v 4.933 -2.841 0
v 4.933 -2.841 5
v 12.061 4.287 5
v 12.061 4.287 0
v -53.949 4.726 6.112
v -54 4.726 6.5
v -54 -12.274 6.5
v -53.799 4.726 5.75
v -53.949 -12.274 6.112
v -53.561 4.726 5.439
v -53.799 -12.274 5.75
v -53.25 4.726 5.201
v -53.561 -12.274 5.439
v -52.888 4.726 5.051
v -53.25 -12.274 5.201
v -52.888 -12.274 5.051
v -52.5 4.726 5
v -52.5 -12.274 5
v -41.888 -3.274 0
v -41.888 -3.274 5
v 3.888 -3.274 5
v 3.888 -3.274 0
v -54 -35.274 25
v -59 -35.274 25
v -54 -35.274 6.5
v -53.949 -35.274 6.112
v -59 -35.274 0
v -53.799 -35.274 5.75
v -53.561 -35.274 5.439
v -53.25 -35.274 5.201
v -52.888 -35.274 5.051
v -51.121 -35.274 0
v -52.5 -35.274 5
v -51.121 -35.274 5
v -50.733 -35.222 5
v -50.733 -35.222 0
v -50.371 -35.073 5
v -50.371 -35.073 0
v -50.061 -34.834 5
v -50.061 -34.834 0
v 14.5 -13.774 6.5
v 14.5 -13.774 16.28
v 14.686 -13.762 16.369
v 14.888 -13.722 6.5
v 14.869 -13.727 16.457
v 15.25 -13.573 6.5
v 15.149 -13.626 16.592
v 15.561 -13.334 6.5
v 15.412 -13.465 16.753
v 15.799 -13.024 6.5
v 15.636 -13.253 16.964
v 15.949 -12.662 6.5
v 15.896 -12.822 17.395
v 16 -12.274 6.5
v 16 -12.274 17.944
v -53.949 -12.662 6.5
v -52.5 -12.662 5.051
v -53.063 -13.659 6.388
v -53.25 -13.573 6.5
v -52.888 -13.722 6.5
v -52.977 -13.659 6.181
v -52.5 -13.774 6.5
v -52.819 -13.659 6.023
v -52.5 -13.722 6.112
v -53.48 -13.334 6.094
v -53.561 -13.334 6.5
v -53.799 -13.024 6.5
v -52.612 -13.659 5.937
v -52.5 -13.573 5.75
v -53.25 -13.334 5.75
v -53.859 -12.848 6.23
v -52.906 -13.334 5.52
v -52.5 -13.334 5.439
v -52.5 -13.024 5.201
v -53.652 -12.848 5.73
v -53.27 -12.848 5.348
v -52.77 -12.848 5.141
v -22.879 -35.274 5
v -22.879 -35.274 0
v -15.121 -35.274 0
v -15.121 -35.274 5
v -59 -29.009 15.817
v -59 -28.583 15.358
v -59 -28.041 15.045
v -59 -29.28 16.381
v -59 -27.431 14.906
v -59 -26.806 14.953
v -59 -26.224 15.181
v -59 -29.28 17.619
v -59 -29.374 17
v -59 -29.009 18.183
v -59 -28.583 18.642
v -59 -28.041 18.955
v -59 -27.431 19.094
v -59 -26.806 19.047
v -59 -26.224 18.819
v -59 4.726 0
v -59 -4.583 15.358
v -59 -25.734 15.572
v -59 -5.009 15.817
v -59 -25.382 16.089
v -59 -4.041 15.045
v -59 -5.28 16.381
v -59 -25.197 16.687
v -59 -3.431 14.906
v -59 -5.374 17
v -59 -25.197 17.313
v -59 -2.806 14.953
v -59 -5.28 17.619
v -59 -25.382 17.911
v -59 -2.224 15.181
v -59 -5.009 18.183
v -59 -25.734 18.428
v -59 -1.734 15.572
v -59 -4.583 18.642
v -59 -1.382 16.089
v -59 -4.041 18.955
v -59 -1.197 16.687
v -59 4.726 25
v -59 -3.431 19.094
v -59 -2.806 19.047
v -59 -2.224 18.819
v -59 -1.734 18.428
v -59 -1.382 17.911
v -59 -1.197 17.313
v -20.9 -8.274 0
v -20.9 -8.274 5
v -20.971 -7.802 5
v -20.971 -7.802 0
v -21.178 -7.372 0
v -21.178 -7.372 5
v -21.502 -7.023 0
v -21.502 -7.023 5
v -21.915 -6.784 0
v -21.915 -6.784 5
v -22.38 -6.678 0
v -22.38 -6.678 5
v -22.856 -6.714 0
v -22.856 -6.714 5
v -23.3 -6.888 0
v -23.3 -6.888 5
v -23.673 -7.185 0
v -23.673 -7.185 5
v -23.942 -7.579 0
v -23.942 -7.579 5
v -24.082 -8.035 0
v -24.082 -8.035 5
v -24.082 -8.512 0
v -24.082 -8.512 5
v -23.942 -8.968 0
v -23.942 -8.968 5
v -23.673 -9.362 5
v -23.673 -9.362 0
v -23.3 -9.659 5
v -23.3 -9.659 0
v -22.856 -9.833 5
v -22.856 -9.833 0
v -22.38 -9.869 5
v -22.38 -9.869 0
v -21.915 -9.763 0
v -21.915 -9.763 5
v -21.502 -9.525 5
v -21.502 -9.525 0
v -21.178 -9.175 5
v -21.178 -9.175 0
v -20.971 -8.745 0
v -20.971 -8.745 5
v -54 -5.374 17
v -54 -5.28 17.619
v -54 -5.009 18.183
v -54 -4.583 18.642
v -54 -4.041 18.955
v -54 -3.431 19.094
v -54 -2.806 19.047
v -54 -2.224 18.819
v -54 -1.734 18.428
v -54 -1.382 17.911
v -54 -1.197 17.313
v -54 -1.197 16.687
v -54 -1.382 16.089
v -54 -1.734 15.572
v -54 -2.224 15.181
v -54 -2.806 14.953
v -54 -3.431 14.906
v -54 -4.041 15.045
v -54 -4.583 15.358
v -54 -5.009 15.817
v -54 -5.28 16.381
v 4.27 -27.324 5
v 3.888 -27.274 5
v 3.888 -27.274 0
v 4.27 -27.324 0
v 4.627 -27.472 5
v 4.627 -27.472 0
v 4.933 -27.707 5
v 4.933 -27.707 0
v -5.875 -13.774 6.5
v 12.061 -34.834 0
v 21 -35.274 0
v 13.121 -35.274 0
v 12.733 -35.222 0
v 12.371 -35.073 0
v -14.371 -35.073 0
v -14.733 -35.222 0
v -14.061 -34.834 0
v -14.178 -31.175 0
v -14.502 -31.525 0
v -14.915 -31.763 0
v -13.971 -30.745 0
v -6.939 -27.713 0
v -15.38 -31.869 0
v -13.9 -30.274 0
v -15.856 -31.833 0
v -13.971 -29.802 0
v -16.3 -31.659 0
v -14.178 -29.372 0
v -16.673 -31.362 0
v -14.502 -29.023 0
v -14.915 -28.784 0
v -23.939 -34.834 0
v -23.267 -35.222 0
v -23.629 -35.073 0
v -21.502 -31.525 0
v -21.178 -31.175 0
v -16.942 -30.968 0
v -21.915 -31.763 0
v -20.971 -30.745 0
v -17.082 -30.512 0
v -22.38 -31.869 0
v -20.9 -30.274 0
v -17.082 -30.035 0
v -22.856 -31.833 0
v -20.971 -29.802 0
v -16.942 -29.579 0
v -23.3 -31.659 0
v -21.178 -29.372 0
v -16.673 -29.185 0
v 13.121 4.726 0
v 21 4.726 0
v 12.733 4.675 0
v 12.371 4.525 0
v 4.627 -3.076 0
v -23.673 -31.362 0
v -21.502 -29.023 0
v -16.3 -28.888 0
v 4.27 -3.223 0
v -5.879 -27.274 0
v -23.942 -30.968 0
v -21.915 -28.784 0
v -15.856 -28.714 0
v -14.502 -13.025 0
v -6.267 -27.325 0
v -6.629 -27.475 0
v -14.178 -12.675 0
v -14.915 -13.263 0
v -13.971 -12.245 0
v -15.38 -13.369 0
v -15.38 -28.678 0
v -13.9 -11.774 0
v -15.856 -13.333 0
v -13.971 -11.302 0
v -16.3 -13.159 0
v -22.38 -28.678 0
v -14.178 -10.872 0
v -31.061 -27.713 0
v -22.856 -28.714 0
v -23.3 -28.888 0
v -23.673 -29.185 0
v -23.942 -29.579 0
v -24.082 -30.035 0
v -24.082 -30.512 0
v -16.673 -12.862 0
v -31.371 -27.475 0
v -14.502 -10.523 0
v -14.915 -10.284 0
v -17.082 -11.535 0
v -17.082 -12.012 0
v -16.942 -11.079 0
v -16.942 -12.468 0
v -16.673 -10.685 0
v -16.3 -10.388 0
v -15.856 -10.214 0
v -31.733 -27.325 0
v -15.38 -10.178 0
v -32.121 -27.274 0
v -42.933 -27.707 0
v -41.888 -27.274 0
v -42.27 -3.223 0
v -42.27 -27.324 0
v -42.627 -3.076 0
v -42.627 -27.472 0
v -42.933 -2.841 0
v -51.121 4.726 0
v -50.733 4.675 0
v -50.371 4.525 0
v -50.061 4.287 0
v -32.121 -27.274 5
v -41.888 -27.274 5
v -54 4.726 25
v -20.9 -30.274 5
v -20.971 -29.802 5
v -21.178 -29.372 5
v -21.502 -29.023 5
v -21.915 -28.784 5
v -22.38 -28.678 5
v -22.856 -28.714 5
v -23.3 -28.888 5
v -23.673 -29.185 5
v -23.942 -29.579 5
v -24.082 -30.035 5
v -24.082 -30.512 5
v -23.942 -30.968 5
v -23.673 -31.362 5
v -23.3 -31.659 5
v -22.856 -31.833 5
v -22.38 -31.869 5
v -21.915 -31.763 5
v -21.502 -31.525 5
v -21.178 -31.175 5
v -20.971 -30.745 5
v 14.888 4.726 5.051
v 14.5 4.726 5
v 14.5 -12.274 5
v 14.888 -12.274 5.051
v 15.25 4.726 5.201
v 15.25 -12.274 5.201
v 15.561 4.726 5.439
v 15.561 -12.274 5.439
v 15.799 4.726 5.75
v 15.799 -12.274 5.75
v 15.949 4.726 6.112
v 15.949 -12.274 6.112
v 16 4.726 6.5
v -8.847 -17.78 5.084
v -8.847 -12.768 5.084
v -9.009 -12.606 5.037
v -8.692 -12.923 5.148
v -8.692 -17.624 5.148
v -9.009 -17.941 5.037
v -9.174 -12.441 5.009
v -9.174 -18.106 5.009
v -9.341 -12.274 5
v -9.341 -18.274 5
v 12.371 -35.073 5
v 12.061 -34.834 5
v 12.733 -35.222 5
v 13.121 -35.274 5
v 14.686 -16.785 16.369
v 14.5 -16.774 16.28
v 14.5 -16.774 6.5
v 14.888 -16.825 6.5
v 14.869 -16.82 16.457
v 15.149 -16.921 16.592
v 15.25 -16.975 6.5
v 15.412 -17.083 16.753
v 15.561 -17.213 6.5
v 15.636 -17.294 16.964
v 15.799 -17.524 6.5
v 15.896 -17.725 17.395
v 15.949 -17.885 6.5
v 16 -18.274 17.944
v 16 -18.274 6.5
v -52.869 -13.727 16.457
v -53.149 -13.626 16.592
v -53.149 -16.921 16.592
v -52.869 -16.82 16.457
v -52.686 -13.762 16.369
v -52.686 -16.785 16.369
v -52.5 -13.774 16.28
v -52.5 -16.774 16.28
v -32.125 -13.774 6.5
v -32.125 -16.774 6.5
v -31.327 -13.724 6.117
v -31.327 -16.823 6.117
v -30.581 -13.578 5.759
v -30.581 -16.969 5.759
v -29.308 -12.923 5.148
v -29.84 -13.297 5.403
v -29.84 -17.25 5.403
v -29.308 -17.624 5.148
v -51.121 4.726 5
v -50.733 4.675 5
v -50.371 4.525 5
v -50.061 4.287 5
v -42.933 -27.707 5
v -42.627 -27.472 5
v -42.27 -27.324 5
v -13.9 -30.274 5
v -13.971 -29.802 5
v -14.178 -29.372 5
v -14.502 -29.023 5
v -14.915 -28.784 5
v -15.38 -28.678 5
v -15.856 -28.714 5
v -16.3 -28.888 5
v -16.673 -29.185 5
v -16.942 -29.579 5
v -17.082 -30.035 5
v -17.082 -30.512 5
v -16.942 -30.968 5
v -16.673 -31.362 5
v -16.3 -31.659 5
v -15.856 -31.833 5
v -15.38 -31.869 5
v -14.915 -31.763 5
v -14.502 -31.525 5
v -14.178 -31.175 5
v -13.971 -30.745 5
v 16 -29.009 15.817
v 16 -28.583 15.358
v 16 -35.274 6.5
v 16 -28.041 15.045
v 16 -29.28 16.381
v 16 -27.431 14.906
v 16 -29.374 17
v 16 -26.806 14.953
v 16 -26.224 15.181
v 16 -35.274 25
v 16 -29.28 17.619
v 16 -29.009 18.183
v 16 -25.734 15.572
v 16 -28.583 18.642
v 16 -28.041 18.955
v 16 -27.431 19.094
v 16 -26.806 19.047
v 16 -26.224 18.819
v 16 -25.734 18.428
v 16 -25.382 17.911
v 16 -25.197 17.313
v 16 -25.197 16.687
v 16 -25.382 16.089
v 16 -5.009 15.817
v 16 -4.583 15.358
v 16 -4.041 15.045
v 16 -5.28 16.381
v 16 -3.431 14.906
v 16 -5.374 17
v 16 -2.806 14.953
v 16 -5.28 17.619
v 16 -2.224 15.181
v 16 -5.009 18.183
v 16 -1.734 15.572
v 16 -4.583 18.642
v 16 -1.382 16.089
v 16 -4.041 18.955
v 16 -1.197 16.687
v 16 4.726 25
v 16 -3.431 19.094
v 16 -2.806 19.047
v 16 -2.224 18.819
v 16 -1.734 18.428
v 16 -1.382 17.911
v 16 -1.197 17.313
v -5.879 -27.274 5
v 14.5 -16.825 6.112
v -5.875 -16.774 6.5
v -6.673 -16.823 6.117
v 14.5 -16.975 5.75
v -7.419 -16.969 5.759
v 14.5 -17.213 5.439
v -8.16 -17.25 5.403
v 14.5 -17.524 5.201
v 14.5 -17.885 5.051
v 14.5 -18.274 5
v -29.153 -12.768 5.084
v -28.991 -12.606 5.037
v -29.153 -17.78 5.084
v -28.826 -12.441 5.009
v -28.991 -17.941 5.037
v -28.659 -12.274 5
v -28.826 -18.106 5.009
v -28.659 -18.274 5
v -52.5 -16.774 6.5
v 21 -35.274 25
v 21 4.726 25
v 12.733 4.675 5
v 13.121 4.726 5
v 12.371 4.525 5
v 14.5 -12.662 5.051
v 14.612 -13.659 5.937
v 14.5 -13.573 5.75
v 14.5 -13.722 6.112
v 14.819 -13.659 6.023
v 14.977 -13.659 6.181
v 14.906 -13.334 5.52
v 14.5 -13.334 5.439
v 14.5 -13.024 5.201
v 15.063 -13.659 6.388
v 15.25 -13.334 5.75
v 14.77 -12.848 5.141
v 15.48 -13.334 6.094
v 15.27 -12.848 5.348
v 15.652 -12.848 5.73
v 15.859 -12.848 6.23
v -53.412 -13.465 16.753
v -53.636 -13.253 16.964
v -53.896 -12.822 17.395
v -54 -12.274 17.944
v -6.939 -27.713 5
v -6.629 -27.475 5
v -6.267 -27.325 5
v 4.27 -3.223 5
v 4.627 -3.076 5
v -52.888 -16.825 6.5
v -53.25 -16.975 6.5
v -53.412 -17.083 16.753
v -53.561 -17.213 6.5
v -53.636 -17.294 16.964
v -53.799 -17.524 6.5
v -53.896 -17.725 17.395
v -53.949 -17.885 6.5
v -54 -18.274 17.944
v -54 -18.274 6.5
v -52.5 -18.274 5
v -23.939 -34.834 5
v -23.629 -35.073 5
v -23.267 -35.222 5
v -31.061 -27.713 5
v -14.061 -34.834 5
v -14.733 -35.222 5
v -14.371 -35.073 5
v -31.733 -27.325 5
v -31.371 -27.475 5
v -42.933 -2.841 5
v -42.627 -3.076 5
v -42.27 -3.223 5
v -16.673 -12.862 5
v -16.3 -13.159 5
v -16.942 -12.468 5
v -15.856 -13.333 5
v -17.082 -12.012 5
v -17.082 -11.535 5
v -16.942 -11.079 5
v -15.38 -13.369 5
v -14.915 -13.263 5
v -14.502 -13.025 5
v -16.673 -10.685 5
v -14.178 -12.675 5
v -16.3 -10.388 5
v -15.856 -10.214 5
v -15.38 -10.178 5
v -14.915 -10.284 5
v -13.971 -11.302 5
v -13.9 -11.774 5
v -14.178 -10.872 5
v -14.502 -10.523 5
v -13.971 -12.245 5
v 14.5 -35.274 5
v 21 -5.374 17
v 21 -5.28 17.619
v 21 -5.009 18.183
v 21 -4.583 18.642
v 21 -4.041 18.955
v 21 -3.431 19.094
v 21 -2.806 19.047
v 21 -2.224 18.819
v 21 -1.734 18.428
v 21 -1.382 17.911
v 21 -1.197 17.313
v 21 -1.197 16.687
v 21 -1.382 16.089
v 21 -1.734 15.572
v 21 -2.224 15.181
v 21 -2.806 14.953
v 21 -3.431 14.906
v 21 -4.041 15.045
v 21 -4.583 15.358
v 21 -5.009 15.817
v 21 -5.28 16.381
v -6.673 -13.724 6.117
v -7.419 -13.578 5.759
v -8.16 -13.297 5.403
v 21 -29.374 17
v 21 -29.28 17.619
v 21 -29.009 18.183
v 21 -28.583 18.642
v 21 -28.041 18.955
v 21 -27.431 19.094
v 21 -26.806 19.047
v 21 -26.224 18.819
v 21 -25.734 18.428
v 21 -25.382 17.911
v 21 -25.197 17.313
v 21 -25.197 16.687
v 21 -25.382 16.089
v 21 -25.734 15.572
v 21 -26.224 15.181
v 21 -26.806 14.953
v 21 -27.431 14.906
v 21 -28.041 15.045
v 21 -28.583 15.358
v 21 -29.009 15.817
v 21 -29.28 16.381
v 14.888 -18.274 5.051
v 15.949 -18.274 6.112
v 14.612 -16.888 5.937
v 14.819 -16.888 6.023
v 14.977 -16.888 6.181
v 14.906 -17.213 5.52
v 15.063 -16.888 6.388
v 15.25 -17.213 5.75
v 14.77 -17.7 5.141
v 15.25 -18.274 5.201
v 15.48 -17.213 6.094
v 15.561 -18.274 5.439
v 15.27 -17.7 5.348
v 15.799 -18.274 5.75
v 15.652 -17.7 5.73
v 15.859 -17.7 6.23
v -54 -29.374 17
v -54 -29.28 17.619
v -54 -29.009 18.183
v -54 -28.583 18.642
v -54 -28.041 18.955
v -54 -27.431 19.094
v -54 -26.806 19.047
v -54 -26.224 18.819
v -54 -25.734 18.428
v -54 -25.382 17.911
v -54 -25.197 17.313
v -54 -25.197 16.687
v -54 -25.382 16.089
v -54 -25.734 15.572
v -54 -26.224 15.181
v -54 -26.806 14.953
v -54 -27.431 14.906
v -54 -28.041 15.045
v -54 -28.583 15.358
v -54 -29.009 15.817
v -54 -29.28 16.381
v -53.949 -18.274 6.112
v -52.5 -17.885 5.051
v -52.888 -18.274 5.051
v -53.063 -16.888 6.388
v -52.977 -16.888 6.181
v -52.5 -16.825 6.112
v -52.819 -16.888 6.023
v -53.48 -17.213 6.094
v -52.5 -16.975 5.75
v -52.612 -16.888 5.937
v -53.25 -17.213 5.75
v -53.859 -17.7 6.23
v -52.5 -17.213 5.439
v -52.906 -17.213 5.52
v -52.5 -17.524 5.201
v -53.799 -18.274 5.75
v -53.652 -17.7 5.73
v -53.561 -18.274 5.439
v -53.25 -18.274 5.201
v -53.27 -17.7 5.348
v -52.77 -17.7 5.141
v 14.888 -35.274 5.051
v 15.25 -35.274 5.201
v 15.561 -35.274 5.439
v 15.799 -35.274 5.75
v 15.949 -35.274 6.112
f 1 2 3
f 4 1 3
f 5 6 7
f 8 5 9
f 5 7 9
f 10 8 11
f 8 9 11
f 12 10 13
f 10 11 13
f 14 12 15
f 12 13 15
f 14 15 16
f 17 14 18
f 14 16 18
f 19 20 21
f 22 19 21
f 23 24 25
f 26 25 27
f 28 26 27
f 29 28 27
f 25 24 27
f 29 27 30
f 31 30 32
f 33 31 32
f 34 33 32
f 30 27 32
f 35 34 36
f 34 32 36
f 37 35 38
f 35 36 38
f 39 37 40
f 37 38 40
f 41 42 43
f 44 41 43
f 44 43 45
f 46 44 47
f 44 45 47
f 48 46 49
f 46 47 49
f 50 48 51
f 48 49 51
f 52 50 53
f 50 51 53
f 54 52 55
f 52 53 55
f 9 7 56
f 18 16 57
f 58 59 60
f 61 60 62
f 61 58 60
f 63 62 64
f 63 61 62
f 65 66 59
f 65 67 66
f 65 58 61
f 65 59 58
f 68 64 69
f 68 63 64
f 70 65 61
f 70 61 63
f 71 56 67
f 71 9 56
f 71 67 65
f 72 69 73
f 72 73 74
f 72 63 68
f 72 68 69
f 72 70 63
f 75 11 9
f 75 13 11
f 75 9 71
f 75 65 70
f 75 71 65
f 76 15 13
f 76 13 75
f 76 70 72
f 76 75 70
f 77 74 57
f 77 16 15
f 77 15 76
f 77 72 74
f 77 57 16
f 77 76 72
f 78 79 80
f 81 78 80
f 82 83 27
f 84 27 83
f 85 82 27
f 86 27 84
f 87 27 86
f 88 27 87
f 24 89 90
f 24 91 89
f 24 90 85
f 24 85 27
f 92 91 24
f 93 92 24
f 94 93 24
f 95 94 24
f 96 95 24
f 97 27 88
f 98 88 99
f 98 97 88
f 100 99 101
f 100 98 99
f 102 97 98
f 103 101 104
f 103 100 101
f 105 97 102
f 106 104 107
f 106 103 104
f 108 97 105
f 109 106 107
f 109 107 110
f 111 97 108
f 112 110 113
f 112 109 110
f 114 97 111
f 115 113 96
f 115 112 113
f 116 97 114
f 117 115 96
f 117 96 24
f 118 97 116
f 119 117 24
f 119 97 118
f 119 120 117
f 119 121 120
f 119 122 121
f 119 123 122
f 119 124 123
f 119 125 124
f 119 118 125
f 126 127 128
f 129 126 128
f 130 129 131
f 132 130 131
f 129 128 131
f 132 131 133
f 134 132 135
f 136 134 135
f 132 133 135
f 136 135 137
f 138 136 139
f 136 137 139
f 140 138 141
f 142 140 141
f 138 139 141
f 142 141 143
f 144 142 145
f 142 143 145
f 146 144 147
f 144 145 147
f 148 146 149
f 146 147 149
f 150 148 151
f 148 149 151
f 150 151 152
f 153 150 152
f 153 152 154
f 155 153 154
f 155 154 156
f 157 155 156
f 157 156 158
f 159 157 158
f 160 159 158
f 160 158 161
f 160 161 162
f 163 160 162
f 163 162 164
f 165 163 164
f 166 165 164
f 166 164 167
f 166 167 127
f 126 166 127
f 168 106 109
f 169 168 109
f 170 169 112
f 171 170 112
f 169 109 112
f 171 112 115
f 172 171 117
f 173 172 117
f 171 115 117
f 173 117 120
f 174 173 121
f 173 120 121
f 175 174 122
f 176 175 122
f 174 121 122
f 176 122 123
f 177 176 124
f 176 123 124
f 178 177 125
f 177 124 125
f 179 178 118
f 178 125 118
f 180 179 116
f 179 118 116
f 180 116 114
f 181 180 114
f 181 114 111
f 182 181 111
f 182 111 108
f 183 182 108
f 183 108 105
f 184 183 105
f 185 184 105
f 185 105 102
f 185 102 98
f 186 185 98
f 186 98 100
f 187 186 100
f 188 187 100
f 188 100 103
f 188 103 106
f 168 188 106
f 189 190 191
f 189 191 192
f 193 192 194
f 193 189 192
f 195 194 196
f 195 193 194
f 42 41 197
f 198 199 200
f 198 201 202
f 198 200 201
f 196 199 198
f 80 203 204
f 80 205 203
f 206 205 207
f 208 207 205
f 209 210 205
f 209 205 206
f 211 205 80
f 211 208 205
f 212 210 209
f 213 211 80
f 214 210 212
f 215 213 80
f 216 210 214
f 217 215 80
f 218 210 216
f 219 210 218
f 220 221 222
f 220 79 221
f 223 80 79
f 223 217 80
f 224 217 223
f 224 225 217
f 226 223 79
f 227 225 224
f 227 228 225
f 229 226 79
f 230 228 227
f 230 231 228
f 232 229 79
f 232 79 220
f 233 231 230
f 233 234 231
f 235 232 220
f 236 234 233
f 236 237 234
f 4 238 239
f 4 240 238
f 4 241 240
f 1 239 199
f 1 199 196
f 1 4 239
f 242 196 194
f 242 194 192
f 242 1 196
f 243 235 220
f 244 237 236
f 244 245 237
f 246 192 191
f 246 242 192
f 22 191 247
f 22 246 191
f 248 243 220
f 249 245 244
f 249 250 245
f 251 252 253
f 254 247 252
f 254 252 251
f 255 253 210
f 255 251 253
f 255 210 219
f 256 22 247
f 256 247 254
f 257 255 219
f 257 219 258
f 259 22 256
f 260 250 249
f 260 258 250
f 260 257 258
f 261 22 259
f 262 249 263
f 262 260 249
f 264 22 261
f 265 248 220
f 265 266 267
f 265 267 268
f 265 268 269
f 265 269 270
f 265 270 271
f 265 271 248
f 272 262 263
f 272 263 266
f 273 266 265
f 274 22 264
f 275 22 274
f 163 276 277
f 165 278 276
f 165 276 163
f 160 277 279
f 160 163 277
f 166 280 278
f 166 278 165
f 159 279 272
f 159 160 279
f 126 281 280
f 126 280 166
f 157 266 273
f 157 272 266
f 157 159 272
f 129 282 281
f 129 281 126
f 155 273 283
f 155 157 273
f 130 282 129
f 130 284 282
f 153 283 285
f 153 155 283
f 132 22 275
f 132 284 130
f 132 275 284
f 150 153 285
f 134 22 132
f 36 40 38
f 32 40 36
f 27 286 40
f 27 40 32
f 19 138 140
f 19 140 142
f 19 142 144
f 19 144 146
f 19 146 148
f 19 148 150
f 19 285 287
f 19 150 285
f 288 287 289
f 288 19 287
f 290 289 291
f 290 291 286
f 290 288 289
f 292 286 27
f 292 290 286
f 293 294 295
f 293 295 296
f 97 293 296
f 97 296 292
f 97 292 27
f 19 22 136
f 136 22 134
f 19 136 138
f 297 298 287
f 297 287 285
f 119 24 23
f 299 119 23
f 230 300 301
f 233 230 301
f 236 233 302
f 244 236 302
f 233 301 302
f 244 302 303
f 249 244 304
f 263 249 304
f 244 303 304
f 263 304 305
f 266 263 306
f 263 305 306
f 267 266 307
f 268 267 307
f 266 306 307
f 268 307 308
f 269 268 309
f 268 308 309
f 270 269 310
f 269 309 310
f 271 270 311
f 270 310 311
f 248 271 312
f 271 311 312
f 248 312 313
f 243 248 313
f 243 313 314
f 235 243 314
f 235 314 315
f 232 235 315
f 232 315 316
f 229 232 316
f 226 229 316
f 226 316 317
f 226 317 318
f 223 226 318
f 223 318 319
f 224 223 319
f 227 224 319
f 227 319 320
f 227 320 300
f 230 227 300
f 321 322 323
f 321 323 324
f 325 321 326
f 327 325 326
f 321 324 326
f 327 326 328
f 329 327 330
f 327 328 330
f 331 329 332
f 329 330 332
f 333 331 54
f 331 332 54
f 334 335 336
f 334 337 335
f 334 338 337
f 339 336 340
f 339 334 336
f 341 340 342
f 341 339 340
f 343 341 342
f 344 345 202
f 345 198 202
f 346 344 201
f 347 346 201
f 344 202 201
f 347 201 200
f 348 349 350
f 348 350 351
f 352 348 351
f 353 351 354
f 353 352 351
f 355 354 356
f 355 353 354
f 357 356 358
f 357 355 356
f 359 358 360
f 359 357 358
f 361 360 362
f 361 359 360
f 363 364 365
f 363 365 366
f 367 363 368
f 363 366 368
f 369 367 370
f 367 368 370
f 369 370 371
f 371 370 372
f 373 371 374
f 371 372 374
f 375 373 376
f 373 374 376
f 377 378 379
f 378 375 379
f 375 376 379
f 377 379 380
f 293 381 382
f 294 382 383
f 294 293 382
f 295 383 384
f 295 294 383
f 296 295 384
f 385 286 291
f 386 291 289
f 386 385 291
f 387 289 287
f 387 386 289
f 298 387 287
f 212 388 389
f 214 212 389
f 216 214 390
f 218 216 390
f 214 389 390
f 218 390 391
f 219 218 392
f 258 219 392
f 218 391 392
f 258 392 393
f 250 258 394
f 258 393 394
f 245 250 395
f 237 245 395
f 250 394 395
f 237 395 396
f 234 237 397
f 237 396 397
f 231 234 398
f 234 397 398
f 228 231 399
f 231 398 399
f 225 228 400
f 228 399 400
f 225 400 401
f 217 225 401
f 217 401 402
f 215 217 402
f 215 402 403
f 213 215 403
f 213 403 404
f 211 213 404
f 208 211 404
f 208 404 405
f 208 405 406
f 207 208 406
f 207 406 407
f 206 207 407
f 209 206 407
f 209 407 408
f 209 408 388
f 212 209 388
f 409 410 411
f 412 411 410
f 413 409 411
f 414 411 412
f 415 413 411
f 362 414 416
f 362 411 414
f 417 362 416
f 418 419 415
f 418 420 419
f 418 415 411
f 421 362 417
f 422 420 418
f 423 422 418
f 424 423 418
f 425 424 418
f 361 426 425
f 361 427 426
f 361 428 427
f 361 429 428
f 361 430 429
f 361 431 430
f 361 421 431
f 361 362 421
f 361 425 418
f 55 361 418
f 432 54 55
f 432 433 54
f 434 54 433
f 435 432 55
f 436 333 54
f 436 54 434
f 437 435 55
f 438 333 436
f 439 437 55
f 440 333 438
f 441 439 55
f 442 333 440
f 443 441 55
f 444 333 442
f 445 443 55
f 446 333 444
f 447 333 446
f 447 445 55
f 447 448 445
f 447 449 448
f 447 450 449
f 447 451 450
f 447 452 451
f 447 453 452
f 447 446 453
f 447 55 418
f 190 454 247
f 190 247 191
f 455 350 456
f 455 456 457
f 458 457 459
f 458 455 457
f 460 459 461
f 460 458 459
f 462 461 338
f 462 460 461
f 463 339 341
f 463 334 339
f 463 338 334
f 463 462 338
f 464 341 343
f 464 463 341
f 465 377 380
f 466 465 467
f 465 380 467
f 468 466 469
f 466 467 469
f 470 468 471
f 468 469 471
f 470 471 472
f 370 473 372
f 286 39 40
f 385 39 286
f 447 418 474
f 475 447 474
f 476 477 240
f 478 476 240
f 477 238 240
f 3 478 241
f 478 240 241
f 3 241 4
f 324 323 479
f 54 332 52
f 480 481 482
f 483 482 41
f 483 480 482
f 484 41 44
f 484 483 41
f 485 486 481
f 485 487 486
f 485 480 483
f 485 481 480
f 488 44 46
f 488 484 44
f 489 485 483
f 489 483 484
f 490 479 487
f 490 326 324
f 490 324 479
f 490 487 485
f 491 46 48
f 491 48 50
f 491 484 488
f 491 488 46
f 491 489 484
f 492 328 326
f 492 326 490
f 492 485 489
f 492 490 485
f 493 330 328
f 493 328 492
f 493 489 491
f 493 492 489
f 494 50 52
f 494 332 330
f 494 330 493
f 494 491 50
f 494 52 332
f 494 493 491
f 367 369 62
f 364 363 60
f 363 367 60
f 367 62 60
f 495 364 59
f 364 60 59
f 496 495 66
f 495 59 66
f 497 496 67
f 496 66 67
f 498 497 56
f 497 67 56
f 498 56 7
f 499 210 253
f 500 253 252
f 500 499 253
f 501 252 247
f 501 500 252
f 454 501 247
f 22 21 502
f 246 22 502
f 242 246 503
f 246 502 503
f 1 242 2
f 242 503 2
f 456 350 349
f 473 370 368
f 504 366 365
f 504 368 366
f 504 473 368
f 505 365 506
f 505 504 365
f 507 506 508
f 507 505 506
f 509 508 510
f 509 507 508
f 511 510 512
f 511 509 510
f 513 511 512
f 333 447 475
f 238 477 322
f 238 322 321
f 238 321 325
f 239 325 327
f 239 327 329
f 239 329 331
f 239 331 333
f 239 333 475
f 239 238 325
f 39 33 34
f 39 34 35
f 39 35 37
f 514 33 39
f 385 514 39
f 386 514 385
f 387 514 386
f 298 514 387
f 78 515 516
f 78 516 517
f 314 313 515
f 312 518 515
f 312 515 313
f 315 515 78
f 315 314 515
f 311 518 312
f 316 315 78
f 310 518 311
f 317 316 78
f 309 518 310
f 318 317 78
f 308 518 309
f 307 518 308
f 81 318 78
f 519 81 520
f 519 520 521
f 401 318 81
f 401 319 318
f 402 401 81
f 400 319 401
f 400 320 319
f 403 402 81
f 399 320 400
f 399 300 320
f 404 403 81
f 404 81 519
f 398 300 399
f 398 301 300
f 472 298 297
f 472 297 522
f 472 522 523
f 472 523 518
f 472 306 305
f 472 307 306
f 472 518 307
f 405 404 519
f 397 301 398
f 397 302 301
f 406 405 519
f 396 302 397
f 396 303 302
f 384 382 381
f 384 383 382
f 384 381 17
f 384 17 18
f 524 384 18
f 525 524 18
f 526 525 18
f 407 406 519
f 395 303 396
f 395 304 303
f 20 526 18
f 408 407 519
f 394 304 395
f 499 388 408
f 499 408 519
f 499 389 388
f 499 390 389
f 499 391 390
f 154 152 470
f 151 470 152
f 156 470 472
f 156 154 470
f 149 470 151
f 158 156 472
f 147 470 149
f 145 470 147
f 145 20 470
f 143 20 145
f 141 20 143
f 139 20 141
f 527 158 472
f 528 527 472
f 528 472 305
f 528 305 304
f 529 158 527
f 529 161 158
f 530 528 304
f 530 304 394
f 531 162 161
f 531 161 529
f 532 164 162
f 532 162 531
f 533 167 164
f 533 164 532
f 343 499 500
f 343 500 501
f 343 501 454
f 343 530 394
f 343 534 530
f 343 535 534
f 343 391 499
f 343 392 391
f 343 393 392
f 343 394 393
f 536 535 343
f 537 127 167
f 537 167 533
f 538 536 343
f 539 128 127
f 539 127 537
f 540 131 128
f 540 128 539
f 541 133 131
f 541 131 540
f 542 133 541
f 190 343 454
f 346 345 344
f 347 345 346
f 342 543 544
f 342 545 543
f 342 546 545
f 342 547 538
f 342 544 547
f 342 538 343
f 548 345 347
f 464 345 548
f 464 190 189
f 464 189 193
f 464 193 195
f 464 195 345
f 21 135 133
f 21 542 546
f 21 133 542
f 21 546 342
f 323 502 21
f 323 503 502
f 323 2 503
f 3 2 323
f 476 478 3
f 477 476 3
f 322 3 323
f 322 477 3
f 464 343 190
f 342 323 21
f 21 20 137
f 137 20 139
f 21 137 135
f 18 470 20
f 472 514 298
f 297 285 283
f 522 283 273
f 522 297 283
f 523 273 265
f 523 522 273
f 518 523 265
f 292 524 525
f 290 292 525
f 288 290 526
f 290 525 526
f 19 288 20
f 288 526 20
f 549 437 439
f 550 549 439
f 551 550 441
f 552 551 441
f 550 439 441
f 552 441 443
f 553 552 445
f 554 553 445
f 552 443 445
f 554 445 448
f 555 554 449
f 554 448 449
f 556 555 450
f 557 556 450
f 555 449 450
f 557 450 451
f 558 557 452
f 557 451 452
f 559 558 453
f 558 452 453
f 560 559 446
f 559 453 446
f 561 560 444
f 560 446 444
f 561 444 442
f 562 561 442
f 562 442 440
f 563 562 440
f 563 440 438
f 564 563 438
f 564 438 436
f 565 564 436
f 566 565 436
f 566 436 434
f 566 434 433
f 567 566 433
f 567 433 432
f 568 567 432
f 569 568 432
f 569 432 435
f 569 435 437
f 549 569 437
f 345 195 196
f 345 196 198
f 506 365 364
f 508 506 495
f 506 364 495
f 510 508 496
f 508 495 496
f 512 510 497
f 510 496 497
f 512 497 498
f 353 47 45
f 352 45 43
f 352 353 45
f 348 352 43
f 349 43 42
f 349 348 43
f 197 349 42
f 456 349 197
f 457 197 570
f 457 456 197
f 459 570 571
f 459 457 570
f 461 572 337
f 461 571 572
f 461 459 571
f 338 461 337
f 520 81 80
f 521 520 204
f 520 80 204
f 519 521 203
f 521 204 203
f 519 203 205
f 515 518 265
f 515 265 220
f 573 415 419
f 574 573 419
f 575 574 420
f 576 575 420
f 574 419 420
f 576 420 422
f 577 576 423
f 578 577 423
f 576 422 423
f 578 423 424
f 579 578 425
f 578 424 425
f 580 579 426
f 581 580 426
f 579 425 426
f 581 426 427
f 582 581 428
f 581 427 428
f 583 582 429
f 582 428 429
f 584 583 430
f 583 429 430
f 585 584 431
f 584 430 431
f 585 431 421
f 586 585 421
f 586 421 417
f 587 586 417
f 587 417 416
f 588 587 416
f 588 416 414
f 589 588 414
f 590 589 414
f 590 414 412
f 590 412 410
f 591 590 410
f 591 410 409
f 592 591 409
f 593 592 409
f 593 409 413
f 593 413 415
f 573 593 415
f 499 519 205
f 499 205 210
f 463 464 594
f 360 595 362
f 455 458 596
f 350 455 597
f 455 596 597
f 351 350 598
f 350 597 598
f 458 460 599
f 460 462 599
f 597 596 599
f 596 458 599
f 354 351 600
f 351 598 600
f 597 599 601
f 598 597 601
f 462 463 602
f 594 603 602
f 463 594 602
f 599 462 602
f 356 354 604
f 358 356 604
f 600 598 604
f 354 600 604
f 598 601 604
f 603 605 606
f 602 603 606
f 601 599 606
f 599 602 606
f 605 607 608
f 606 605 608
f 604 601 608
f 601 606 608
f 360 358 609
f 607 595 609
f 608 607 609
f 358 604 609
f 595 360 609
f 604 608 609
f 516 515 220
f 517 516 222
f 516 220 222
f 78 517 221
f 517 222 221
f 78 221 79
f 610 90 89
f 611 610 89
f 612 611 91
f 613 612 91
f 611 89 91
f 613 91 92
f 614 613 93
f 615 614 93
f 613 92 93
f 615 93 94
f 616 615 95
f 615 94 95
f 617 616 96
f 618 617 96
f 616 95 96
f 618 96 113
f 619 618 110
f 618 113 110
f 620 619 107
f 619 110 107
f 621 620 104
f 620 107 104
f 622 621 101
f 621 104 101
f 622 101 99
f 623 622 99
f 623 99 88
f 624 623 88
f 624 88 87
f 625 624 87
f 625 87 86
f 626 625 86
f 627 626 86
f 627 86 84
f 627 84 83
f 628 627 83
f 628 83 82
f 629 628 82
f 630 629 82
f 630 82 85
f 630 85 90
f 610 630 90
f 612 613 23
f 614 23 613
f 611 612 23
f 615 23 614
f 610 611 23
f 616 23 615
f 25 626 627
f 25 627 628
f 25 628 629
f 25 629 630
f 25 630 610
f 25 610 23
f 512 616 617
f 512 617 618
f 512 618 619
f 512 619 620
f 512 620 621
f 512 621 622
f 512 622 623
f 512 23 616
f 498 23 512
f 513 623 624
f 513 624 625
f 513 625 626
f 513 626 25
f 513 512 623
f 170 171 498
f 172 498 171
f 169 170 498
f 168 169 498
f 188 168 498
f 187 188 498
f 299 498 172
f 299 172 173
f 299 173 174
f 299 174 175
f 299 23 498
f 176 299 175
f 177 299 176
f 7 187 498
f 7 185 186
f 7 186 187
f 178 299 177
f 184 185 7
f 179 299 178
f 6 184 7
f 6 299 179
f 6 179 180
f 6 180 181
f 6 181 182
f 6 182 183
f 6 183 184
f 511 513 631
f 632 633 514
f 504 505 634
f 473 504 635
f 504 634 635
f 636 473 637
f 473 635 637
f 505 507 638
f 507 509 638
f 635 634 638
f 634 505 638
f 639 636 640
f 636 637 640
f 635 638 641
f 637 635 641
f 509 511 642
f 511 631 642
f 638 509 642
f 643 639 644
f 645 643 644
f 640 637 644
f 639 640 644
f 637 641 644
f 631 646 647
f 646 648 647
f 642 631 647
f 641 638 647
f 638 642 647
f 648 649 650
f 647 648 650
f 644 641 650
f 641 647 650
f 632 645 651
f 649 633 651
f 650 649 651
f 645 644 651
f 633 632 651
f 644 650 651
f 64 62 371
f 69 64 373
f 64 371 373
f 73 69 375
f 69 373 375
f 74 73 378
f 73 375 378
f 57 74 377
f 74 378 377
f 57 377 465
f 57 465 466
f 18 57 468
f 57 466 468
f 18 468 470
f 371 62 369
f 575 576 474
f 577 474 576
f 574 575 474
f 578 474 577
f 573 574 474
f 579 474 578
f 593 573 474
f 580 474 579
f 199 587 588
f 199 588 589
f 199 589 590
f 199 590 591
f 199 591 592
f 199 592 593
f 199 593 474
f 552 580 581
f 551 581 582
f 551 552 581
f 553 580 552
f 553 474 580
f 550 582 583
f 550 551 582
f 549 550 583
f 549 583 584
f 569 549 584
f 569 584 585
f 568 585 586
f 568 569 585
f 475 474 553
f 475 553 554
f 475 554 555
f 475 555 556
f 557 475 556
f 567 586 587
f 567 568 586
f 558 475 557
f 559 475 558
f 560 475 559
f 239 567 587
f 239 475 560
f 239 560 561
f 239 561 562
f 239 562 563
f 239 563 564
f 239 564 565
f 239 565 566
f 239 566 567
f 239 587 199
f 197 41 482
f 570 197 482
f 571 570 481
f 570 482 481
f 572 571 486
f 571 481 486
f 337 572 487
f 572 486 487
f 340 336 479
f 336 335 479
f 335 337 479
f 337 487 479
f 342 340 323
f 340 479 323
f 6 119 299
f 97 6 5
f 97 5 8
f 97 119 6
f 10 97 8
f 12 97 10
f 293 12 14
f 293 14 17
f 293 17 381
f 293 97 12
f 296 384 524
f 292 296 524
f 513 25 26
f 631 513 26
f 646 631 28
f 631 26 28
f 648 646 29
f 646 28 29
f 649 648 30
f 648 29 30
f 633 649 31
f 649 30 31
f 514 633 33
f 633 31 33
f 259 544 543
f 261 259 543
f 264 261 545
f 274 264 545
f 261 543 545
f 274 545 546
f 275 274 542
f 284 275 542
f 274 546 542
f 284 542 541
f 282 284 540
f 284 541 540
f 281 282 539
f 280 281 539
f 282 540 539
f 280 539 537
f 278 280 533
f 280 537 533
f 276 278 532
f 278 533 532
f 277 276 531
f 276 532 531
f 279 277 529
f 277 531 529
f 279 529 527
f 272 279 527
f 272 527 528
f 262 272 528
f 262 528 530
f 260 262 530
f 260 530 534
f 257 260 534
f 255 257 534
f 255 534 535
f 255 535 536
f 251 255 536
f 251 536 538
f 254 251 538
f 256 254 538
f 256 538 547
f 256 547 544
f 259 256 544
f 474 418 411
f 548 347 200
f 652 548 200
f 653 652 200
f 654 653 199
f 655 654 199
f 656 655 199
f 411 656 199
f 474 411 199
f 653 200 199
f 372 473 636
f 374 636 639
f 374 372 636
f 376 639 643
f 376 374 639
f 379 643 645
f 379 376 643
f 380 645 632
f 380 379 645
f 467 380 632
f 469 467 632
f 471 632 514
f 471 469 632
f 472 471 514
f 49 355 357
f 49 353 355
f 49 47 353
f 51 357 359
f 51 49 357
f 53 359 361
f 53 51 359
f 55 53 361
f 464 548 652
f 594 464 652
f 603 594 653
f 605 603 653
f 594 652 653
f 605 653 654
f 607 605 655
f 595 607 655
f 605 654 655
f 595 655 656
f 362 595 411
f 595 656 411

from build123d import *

# Parameters (mm, degrees)
EXTRUDE_1_DEPTH     = 40
FILLET_1_R          = 1.5
SKETCH_3_R          = 1.6
CUT_EXTRUDE_1_DEPTH = 40
SKETCH_4_R          = 2.1
CUT_EXTRUDE_2_DEPTH = 80
SKETCH_5_R          = 1.6
CUT_EXTRUDE_3_DEPTH = 80
CUT_EXTRUDE_4_DEPTH = 10
FILLET_4_R          = 1.5
EXTRUDE_2_DEPTH     = 1.5
FILLET_5_R          = 1.5
FILLET_6_R          = 1.5


with BuildPart() as part:
    # 草图2 → 凸台-拉伸1 (new body)
    with BuildSketch(Plane(origin=(0, 4.726404994, 0), x_dir=(1, 0, 0), z_dir=(0, 1, 0))):
        Polygon((21, 0), (-59, 0), (-59, -25), (-54, -25), (-54, -5), (16, -5), (16, -25), (21, -25), align=None)
    extrude(amount=-EXTRUDE_1_DEPTH)

    # 圆角1
    fillet_1_edges = [part.edges().sort_by_distance(p)[0] for p in [
        (16, -15.273595006, 5),
        (-54, -15.273595006, 5),
    ]]
    fillet(fillet_1_edges, radius=FILLET_1_R)

    # 草图3 → 切除-拉伸1 (cut)
    with BuildSketch(Plane.XY.offset(5)):
        with Locations((-22.5, -30.273595006)):
            Circle(SKETCH_3_R)
        with Locations((-22.5, -8.273595006)):
            Circle(SKETCH_3_R)
    extrude(amount=-CUT_EXTRUDE_1_DEPTH, mode=Mode.SUBTRACT)

    # 草图4 → 切除-拉伸2 (cut)
    with BuildSketch(Plane.ZY.offset(59)):
        with Locations(Location((17, -3.273595006, 0), (0, 0, 270))):
            Circle(SKETCH_4_R)
        with Locations(Location((17, -27.273595006, 0), (0, 0, 270))):
            Circle(SKETCH_4_R)
    extrude(amount=-CUT_EXTRUDE_2_DEPTH, mode=Mode.SUBTRACT)

    # 草图5 → 切除-拉伸3 (cut)
    with BuildSketch(Plane.XY.offset(5)):
        with Locations((-15.5, -30.273595006)):
            Circle(SKETCH_5_R)
        with Locations((-15.5, -11.773595006)):
            Circle(SKETCH_5_R)
    extrude(amount=-CUT_EXTRUDE_3_DEPTH, mode=Mode.SUBTRACT)

    # 草图7 → 切除-拉伸4 (cut)
    with BuildSketch(Plane.XY.offset(5)):
        with BuildLine():
            Line((-50.5, 4.726404994), (-42.933047922, -2.840547084))
            ThreePointArc((-42.933047922, -2.840547084), (-42.453382132, -3.161049518), (-41.887577755, -3.273595006))
            Line((-41.887577755, -3.273595006), (3.887577755, -3.273595006))
            ThreePointArc((3.887577755, -3.273595006), (4.453382132, -3.161049518), (4.933047922, -2.840547084))
            Line((4.933047922, -2.840547084), (12.5, 4.726404994))
            Line((12.5, 4.726404994), (-50.5, 4.726404994))
        make_face()
        with BuildLine():
            Line((12.5, -35.273595006), (-14.5, -35.273595006))
            Line((-14.5, -35.273595006), (-6.939339828, -27.712934835))
            ThreePointArc((-6.939339828, -27.712934835), (-6.452704805, -27.387775708), (-5.878679656, -27.273595006))
            Line((-5.878679656, -27.273595006), (3.887577755, -27.273595006))
            ThreePointArc((3.887577755, -27.273595006), (4.453382132, -27.386140495), (4.933047922, -27.706642929))
            Line((4.933047922, -27.706642929), (12.5, -35.273595006))
        make_face()
        with BuildLine():
            Line((-41.887577755, -27.273595006), (-32.121320344, -27.273595006))
            ThreePointArc((-32.121320344, -27.273595006), (-31.547295195, -27.387775708), (-31.060660172, -27.712934835))
            Line((-31.060660172, -27.712934835), (-23.5, -35.273595006))
            Line((-23.5, -35.273595006), (-50.5, -35.273595006))
            Line((-50.5, -35.273595006), (-42.933047922, -27.706642929))
            ThreePointArc((-42.933047922, -27.706642929), (-42.453382132, -27.386140495), (-41.887577755, -27.273595006))
        make_face()
    extrude(amount=-CUT_EXTRUDE_4_DEPTH, mode=Mode.SUBTRACT)

    # 圆角4
    fillet_4_edges = [part.edges().sort_by_distance(p)[0] for p in [
        (-50.5, 4.726404994, 2.5),
        (12.5, 4.726404994, 2.5),
        (-14.5, -35.273595006, 2.5),
        (12.5, -35.273595006, 2.5),
        (-50.5, -35.273595006, 2.5),
        (-23.5, -35.273595006, 2.5),
    ]]
    fillet(fillet_4_edges, radius=FILLET_4_R)

    # 草图6 → 凸台-拉伸2 (add, symmetric)
    with BuildSketch(Plane(origin=(0, -15.273595006, 0), x_dir=(-1, 0, 0), z_dir=(0, -1, 0))):
        Polygon((-16, -17), (9, -5), (-16, -5), align=None)
    extrude_2 = extrude(amount=EXTRUDE_2_DEPTH, both=True)

    # 圆角5
    fillet_5_edges = [part.edges().sort_by_distance(p)[0] for p in [
        (15.560660172, -16.773595006, 5.439339828),
        (15.560660172, -13.773595006, 5.439339828),
        (2.75, -13.773595006, 5),
        (2.75, -16.773595006, 5),
        (16, -16.773595006, 11.75),
        (16, -13.773595006, 11.75),
        (16, -15.273595006, 17),
        (-9, -15.273595006, 5),
    ]]
    fillet(fillet_5_edges, radius=FILLET_5_R)

    # 镜向2: 凸台-拉伸2 across plane
    add(extrude_2.mirror(Plane.ZY.offset(19)))

    # 圆角6
    fillet_6_edges = [part.edges().sort_by_distance(p)[0] for p in [
        (-53.560660172, -16.773595006, 5.439339828),
        (-53.560660172, -13.773595006, 5.439339828),
        (-40.75, -16.773595006, 5),
        (-29, -15.273595006, 5),
        (-54, -13.773595006, 11.75),
        (-40.75, -13.773595006, 5),
        (-54, -16.773595006, 11.75),
        (-54, -15.273595006, 17),
    ]]
    fillet(fillet_6_edges, radius=FILLET_6_R)


solid = part.part
